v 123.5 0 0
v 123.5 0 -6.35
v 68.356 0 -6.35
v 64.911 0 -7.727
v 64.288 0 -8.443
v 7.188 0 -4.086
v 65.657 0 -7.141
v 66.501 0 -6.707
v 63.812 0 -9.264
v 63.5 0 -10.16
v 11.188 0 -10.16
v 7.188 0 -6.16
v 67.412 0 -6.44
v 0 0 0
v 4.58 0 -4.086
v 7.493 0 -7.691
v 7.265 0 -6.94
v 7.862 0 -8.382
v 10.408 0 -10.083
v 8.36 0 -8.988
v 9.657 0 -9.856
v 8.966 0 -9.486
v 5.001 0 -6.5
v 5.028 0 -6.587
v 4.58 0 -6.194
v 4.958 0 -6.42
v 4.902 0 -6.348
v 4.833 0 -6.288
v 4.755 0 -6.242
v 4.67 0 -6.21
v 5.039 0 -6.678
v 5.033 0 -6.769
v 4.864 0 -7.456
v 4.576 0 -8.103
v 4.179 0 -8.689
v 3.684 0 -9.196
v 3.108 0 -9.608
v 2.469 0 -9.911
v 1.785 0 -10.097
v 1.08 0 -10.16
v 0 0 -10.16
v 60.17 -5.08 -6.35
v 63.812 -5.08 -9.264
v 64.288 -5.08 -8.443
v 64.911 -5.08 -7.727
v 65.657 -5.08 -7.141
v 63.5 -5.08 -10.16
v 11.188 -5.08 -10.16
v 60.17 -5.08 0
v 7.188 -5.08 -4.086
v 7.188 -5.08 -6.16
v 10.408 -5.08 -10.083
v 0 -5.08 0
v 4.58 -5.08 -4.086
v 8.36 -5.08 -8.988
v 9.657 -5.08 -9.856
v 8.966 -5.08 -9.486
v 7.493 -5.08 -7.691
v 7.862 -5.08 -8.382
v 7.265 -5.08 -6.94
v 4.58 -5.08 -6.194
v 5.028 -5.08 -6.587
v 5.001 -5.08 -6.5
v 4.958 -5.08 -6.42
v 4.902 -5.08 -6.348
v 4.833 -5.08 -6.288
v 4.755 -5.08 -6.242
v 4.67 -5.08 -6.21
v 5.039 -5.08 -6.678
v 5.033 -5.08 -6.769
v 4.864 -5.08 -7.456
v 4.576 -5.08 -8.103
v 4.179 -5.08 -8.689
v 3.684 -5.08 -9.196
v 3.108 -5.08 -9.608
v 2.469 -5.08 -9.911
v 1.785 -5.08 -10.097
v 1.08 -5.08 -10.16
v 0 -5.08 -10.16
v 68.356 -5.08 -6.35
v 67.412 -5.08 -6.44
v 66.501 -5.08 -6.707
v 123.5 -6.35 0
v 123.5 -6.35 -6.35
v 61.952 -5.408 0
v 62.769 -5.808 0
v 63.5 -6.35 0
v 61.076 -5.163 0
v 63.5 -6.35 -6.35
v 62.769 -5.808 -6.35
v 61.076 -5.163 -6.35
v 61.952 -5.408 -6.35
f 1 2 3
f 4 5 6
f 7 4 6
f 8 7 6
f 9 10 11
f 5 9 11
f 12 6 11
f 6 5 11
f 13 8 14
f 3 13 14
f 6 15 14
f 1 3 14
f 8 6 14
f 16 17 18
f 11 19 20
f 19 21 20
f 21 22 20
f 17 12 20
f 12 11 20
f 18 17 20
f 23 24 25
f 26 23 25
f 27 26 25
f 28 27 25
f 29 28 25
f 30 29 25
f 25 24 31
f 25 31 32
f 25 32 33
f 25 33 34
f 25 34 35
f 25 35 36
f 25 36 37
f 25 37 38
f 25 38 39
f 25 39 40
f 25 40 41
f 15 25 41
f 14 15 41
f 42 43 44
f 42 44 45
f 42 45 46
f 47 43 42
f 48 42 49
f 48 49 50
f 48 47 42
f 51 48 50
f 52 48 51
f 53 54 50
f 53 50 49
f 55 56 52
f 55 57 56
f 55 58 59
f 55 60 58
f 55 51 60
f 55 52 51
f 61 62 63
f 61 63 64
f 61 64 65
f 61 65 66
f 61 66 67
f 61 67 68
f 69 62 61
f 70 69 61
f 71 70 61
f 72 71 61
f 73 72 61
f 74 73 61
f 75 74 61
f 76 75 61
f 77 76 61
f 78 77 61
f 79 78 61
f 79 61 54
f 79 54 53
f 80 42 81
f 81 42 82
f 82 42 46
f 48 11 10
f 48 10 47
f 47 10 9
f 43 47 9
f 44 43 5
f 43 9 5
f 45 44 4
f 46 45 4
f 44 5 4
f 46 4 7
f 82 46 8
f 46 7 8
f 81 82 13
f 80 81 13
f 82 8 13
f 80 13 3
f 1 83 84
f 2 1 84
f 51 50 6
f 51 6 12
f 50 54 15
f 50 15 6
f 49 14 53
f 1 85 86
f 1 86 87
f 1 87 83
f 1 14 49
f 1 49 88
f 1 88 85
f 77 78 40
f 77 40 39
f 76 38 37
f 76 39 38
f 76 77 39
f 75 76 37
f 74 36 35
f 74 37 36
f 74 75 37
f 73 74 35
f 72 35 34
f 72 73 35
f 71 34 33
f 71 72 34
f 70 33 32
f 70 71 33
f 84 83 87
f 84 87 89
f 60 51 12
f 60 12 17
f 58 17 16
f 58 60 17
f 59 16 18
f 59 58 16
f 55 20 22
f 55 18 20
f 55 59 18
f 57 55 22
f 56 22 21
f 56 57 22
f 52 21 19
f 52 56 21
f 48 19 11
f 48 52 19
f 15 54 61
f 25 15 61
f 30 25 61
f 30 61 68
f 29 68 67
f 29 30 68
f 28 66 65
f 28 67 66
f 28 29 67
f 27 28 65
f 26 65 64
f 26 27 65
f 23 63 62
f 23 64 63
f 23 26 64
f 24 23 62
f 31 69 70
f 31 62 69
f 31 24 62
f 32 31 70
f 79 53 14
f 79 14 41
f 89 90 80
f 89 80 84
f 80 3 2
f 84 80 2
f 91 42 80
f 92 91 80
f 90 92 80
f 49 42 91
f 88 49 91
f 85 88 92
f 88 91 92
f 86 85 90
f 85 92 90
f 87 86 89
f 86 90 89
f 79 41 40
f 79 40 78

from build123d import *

# Parameters (mm, degrees)
SKETCH1_W           = 10.16
SKETCH1_H           = 5.08
BOSS_EXTRUDE1_DEPTH = 63.5
SKETCH2_W           = 2.1082
SKETCH2_H           = 6.073980388
CUT_EXTRUDE1_DEPTH  = 6
SKETCH3_W           = 0.5
SKETCH3_H           = 2.1082
CUT_EXTRUDE2_DEPTH  = 6
SKETCH4_W           = 6.35
SKETCH4_H           = 6.35
BOSS_EXTRUDE2_DEPTH = 60
FILLET3_R           = 4
FILLET4_R           = 0.5
FILLET6_R           = 5
FILLET10_R          = 5


with BuildPart() as part:
    # Sketch1 → Boss-Extrude1 (new body)
    with BuildSketch(Plane(origin=(0, 0, 0), x_dir=(0, 0, -1), z_dir=(1, 0, 0))):
        with Locations((5.08, 2.54)):
            Rectangle(SKETCH1_W, SKETCH1_H)
    extrude(amount=BOSS_EXTRUDE1_DEPTH)

    # Sketch2 → Cut-Extrude1 (cut)
    with BuildSketch(Plane(origin=(0, 5.08, 0), x_dir=(1, 0, 0), z_dir=(0, 1, 0))):
        with Locations((6.1341, 7.123009806)):
            Rectangle(SKETCH2_W, SKETCH2_H)
    extrude(amount=-CUT_EXTRUDE1_DEPTH, mode=Mode.SUBTRACT)

    # Sketch3 → Cut-Extrude2 (cut)
    with BuildSketch(Plane(origin=(0, 5.08, 0), x_dir=(1, 0, 0), z_dir=(0, 1, 0))):
        with Locations((4.83, 5.140119612)):
            Rectangle(SKETCH3_W, SKETCH3_H)
    extrude(amount=-CUT_EXTRUDE2_DEPTH, mode=Mode.SUBTRACT)

    # Sketch4 → Boss-Extrude2 (add)
    with BuildSketch(Plane(origin=(63.5, 0, 0), x_dir=(0, 0, -1), z_dir=(1, 0, 0))):
        with Locations((3.175, 3.175)):
            Rectangle(SKETCH4_W, SKETCH4_H)
    extrude(amount=BOSS_EXTRUDE2_DEPTH)

    # Fillet3
    # the kernel refuses this fillet: 4 mm, written as the material it takes off along each edge
    with BuildSketch(Plane(origin=(7.1882, 15.08, -10.16), x_dir=(0, 0, 1), z_dir=(0, -1, 0)), Plane(origin=(5.08, 15.08, -10.16), x_dir=(-1, 0, 0), z_dir=(0, -1, 0))) as fillet3_piece_1:
        with BuildLine():
            CenterArc((FILLET3_R, -FILLET3_R), FILLET3_R, 90, 90)
            Line((0, -FILLET3_R), (0, 0))
            Line((0, 0), (FILLET3_R, 0))
        make_face()
    extrude(amount=25.08, mode=Mode.SUBTRACT)

    # Fillet4
    # the kernel refuses this fillet: 0.5 mm, written as the material it takes off along each edge
    with BuildSketch(Plane(origin=(5.079853625, -1.440722871, -6.194219612), x_dir=(-0.08056618488507147, 0, -0.9967492612754044), z_dir=(0, 1, 0))) as fillet4_piece_1:
        with BuildLine():
            CenterArc((0.540271076, 0.498701011), FILLET4_R, 180.054119318, 94.076825667)
            Line((0.0402713, 0.498228731), (0.030271304, 0.498219285))
            ThreePointArc((0.030271304, 0.498219285), (0.010168157, 0.249920027), (-0.009967493, 0.000805662))
            Line((-0.009967493, 0.000805662), (-0.000720361, -0.00997402))
            ThreePointArc((-0.000720361, -0.00997402), (0.288144574, -0.020391911), (0.57700951, -0.00997402))
            Line((0.57700951, -0.00997402), (0.576289148, 0))
        make_face()
    extrude(amount=7.961445741, mode=Mode.SUBTRACT)

    # Fillet6
    # the kernel refuses this fillet: 5 mm, written as the material it adds along each edge
    with BuildSketch(Plane(origin=(63.5, 5.08, -6.35), x_dir=(-1, 0, 0), z_dir=(0, 0, 1))) as fillet6_piece_1:
        with BuildLine():
            CenterArc((3.329729719, -5), FILLET6_R, 90, 41.754936598)
            Line((0, -1.27), (0, 0))
            Line((0, 0), (3.329729719, 0))
        make_face()
    extrude(amount=6.35)

    # Fillet10
    # the kernel refuses this fillet: 5 mm, written as the material it adds along each edge
    with BuildSketch(Plane(origin=(63.5, 0, -6.35), x_dir=(1, 0, 0), z_dir=(0, 1, 0))) as fillet10_piece_1:
        with BuildLine():
            CenterArc((4.856325772, 5), FILLET10_R, 193.768528752, 76.231471248)
            Line((0, 3.81), (-0.097126515, 3.7862))
            ThreePointArc((-0.097126515, 3.7862), (-0.1, 1.905), (-0.1, 0))
            Line((-0.1, 0), (0, -0.1))
            Line((0, -0.1), (4.856325772, -0.1))
            Line((4.856325772, -0.1), (4.856325772, 0))
        make_face()
    extrude(amount=5.08)


with BuildPart() as body_2:
    # Mirror1: mirrored copy
    add(part.part.mirror(Plane(origin=(63.5, 0, 0), x_dir=(0, 0, 1), z_dir=(0, 1, 0))))


solid = body_2.part
